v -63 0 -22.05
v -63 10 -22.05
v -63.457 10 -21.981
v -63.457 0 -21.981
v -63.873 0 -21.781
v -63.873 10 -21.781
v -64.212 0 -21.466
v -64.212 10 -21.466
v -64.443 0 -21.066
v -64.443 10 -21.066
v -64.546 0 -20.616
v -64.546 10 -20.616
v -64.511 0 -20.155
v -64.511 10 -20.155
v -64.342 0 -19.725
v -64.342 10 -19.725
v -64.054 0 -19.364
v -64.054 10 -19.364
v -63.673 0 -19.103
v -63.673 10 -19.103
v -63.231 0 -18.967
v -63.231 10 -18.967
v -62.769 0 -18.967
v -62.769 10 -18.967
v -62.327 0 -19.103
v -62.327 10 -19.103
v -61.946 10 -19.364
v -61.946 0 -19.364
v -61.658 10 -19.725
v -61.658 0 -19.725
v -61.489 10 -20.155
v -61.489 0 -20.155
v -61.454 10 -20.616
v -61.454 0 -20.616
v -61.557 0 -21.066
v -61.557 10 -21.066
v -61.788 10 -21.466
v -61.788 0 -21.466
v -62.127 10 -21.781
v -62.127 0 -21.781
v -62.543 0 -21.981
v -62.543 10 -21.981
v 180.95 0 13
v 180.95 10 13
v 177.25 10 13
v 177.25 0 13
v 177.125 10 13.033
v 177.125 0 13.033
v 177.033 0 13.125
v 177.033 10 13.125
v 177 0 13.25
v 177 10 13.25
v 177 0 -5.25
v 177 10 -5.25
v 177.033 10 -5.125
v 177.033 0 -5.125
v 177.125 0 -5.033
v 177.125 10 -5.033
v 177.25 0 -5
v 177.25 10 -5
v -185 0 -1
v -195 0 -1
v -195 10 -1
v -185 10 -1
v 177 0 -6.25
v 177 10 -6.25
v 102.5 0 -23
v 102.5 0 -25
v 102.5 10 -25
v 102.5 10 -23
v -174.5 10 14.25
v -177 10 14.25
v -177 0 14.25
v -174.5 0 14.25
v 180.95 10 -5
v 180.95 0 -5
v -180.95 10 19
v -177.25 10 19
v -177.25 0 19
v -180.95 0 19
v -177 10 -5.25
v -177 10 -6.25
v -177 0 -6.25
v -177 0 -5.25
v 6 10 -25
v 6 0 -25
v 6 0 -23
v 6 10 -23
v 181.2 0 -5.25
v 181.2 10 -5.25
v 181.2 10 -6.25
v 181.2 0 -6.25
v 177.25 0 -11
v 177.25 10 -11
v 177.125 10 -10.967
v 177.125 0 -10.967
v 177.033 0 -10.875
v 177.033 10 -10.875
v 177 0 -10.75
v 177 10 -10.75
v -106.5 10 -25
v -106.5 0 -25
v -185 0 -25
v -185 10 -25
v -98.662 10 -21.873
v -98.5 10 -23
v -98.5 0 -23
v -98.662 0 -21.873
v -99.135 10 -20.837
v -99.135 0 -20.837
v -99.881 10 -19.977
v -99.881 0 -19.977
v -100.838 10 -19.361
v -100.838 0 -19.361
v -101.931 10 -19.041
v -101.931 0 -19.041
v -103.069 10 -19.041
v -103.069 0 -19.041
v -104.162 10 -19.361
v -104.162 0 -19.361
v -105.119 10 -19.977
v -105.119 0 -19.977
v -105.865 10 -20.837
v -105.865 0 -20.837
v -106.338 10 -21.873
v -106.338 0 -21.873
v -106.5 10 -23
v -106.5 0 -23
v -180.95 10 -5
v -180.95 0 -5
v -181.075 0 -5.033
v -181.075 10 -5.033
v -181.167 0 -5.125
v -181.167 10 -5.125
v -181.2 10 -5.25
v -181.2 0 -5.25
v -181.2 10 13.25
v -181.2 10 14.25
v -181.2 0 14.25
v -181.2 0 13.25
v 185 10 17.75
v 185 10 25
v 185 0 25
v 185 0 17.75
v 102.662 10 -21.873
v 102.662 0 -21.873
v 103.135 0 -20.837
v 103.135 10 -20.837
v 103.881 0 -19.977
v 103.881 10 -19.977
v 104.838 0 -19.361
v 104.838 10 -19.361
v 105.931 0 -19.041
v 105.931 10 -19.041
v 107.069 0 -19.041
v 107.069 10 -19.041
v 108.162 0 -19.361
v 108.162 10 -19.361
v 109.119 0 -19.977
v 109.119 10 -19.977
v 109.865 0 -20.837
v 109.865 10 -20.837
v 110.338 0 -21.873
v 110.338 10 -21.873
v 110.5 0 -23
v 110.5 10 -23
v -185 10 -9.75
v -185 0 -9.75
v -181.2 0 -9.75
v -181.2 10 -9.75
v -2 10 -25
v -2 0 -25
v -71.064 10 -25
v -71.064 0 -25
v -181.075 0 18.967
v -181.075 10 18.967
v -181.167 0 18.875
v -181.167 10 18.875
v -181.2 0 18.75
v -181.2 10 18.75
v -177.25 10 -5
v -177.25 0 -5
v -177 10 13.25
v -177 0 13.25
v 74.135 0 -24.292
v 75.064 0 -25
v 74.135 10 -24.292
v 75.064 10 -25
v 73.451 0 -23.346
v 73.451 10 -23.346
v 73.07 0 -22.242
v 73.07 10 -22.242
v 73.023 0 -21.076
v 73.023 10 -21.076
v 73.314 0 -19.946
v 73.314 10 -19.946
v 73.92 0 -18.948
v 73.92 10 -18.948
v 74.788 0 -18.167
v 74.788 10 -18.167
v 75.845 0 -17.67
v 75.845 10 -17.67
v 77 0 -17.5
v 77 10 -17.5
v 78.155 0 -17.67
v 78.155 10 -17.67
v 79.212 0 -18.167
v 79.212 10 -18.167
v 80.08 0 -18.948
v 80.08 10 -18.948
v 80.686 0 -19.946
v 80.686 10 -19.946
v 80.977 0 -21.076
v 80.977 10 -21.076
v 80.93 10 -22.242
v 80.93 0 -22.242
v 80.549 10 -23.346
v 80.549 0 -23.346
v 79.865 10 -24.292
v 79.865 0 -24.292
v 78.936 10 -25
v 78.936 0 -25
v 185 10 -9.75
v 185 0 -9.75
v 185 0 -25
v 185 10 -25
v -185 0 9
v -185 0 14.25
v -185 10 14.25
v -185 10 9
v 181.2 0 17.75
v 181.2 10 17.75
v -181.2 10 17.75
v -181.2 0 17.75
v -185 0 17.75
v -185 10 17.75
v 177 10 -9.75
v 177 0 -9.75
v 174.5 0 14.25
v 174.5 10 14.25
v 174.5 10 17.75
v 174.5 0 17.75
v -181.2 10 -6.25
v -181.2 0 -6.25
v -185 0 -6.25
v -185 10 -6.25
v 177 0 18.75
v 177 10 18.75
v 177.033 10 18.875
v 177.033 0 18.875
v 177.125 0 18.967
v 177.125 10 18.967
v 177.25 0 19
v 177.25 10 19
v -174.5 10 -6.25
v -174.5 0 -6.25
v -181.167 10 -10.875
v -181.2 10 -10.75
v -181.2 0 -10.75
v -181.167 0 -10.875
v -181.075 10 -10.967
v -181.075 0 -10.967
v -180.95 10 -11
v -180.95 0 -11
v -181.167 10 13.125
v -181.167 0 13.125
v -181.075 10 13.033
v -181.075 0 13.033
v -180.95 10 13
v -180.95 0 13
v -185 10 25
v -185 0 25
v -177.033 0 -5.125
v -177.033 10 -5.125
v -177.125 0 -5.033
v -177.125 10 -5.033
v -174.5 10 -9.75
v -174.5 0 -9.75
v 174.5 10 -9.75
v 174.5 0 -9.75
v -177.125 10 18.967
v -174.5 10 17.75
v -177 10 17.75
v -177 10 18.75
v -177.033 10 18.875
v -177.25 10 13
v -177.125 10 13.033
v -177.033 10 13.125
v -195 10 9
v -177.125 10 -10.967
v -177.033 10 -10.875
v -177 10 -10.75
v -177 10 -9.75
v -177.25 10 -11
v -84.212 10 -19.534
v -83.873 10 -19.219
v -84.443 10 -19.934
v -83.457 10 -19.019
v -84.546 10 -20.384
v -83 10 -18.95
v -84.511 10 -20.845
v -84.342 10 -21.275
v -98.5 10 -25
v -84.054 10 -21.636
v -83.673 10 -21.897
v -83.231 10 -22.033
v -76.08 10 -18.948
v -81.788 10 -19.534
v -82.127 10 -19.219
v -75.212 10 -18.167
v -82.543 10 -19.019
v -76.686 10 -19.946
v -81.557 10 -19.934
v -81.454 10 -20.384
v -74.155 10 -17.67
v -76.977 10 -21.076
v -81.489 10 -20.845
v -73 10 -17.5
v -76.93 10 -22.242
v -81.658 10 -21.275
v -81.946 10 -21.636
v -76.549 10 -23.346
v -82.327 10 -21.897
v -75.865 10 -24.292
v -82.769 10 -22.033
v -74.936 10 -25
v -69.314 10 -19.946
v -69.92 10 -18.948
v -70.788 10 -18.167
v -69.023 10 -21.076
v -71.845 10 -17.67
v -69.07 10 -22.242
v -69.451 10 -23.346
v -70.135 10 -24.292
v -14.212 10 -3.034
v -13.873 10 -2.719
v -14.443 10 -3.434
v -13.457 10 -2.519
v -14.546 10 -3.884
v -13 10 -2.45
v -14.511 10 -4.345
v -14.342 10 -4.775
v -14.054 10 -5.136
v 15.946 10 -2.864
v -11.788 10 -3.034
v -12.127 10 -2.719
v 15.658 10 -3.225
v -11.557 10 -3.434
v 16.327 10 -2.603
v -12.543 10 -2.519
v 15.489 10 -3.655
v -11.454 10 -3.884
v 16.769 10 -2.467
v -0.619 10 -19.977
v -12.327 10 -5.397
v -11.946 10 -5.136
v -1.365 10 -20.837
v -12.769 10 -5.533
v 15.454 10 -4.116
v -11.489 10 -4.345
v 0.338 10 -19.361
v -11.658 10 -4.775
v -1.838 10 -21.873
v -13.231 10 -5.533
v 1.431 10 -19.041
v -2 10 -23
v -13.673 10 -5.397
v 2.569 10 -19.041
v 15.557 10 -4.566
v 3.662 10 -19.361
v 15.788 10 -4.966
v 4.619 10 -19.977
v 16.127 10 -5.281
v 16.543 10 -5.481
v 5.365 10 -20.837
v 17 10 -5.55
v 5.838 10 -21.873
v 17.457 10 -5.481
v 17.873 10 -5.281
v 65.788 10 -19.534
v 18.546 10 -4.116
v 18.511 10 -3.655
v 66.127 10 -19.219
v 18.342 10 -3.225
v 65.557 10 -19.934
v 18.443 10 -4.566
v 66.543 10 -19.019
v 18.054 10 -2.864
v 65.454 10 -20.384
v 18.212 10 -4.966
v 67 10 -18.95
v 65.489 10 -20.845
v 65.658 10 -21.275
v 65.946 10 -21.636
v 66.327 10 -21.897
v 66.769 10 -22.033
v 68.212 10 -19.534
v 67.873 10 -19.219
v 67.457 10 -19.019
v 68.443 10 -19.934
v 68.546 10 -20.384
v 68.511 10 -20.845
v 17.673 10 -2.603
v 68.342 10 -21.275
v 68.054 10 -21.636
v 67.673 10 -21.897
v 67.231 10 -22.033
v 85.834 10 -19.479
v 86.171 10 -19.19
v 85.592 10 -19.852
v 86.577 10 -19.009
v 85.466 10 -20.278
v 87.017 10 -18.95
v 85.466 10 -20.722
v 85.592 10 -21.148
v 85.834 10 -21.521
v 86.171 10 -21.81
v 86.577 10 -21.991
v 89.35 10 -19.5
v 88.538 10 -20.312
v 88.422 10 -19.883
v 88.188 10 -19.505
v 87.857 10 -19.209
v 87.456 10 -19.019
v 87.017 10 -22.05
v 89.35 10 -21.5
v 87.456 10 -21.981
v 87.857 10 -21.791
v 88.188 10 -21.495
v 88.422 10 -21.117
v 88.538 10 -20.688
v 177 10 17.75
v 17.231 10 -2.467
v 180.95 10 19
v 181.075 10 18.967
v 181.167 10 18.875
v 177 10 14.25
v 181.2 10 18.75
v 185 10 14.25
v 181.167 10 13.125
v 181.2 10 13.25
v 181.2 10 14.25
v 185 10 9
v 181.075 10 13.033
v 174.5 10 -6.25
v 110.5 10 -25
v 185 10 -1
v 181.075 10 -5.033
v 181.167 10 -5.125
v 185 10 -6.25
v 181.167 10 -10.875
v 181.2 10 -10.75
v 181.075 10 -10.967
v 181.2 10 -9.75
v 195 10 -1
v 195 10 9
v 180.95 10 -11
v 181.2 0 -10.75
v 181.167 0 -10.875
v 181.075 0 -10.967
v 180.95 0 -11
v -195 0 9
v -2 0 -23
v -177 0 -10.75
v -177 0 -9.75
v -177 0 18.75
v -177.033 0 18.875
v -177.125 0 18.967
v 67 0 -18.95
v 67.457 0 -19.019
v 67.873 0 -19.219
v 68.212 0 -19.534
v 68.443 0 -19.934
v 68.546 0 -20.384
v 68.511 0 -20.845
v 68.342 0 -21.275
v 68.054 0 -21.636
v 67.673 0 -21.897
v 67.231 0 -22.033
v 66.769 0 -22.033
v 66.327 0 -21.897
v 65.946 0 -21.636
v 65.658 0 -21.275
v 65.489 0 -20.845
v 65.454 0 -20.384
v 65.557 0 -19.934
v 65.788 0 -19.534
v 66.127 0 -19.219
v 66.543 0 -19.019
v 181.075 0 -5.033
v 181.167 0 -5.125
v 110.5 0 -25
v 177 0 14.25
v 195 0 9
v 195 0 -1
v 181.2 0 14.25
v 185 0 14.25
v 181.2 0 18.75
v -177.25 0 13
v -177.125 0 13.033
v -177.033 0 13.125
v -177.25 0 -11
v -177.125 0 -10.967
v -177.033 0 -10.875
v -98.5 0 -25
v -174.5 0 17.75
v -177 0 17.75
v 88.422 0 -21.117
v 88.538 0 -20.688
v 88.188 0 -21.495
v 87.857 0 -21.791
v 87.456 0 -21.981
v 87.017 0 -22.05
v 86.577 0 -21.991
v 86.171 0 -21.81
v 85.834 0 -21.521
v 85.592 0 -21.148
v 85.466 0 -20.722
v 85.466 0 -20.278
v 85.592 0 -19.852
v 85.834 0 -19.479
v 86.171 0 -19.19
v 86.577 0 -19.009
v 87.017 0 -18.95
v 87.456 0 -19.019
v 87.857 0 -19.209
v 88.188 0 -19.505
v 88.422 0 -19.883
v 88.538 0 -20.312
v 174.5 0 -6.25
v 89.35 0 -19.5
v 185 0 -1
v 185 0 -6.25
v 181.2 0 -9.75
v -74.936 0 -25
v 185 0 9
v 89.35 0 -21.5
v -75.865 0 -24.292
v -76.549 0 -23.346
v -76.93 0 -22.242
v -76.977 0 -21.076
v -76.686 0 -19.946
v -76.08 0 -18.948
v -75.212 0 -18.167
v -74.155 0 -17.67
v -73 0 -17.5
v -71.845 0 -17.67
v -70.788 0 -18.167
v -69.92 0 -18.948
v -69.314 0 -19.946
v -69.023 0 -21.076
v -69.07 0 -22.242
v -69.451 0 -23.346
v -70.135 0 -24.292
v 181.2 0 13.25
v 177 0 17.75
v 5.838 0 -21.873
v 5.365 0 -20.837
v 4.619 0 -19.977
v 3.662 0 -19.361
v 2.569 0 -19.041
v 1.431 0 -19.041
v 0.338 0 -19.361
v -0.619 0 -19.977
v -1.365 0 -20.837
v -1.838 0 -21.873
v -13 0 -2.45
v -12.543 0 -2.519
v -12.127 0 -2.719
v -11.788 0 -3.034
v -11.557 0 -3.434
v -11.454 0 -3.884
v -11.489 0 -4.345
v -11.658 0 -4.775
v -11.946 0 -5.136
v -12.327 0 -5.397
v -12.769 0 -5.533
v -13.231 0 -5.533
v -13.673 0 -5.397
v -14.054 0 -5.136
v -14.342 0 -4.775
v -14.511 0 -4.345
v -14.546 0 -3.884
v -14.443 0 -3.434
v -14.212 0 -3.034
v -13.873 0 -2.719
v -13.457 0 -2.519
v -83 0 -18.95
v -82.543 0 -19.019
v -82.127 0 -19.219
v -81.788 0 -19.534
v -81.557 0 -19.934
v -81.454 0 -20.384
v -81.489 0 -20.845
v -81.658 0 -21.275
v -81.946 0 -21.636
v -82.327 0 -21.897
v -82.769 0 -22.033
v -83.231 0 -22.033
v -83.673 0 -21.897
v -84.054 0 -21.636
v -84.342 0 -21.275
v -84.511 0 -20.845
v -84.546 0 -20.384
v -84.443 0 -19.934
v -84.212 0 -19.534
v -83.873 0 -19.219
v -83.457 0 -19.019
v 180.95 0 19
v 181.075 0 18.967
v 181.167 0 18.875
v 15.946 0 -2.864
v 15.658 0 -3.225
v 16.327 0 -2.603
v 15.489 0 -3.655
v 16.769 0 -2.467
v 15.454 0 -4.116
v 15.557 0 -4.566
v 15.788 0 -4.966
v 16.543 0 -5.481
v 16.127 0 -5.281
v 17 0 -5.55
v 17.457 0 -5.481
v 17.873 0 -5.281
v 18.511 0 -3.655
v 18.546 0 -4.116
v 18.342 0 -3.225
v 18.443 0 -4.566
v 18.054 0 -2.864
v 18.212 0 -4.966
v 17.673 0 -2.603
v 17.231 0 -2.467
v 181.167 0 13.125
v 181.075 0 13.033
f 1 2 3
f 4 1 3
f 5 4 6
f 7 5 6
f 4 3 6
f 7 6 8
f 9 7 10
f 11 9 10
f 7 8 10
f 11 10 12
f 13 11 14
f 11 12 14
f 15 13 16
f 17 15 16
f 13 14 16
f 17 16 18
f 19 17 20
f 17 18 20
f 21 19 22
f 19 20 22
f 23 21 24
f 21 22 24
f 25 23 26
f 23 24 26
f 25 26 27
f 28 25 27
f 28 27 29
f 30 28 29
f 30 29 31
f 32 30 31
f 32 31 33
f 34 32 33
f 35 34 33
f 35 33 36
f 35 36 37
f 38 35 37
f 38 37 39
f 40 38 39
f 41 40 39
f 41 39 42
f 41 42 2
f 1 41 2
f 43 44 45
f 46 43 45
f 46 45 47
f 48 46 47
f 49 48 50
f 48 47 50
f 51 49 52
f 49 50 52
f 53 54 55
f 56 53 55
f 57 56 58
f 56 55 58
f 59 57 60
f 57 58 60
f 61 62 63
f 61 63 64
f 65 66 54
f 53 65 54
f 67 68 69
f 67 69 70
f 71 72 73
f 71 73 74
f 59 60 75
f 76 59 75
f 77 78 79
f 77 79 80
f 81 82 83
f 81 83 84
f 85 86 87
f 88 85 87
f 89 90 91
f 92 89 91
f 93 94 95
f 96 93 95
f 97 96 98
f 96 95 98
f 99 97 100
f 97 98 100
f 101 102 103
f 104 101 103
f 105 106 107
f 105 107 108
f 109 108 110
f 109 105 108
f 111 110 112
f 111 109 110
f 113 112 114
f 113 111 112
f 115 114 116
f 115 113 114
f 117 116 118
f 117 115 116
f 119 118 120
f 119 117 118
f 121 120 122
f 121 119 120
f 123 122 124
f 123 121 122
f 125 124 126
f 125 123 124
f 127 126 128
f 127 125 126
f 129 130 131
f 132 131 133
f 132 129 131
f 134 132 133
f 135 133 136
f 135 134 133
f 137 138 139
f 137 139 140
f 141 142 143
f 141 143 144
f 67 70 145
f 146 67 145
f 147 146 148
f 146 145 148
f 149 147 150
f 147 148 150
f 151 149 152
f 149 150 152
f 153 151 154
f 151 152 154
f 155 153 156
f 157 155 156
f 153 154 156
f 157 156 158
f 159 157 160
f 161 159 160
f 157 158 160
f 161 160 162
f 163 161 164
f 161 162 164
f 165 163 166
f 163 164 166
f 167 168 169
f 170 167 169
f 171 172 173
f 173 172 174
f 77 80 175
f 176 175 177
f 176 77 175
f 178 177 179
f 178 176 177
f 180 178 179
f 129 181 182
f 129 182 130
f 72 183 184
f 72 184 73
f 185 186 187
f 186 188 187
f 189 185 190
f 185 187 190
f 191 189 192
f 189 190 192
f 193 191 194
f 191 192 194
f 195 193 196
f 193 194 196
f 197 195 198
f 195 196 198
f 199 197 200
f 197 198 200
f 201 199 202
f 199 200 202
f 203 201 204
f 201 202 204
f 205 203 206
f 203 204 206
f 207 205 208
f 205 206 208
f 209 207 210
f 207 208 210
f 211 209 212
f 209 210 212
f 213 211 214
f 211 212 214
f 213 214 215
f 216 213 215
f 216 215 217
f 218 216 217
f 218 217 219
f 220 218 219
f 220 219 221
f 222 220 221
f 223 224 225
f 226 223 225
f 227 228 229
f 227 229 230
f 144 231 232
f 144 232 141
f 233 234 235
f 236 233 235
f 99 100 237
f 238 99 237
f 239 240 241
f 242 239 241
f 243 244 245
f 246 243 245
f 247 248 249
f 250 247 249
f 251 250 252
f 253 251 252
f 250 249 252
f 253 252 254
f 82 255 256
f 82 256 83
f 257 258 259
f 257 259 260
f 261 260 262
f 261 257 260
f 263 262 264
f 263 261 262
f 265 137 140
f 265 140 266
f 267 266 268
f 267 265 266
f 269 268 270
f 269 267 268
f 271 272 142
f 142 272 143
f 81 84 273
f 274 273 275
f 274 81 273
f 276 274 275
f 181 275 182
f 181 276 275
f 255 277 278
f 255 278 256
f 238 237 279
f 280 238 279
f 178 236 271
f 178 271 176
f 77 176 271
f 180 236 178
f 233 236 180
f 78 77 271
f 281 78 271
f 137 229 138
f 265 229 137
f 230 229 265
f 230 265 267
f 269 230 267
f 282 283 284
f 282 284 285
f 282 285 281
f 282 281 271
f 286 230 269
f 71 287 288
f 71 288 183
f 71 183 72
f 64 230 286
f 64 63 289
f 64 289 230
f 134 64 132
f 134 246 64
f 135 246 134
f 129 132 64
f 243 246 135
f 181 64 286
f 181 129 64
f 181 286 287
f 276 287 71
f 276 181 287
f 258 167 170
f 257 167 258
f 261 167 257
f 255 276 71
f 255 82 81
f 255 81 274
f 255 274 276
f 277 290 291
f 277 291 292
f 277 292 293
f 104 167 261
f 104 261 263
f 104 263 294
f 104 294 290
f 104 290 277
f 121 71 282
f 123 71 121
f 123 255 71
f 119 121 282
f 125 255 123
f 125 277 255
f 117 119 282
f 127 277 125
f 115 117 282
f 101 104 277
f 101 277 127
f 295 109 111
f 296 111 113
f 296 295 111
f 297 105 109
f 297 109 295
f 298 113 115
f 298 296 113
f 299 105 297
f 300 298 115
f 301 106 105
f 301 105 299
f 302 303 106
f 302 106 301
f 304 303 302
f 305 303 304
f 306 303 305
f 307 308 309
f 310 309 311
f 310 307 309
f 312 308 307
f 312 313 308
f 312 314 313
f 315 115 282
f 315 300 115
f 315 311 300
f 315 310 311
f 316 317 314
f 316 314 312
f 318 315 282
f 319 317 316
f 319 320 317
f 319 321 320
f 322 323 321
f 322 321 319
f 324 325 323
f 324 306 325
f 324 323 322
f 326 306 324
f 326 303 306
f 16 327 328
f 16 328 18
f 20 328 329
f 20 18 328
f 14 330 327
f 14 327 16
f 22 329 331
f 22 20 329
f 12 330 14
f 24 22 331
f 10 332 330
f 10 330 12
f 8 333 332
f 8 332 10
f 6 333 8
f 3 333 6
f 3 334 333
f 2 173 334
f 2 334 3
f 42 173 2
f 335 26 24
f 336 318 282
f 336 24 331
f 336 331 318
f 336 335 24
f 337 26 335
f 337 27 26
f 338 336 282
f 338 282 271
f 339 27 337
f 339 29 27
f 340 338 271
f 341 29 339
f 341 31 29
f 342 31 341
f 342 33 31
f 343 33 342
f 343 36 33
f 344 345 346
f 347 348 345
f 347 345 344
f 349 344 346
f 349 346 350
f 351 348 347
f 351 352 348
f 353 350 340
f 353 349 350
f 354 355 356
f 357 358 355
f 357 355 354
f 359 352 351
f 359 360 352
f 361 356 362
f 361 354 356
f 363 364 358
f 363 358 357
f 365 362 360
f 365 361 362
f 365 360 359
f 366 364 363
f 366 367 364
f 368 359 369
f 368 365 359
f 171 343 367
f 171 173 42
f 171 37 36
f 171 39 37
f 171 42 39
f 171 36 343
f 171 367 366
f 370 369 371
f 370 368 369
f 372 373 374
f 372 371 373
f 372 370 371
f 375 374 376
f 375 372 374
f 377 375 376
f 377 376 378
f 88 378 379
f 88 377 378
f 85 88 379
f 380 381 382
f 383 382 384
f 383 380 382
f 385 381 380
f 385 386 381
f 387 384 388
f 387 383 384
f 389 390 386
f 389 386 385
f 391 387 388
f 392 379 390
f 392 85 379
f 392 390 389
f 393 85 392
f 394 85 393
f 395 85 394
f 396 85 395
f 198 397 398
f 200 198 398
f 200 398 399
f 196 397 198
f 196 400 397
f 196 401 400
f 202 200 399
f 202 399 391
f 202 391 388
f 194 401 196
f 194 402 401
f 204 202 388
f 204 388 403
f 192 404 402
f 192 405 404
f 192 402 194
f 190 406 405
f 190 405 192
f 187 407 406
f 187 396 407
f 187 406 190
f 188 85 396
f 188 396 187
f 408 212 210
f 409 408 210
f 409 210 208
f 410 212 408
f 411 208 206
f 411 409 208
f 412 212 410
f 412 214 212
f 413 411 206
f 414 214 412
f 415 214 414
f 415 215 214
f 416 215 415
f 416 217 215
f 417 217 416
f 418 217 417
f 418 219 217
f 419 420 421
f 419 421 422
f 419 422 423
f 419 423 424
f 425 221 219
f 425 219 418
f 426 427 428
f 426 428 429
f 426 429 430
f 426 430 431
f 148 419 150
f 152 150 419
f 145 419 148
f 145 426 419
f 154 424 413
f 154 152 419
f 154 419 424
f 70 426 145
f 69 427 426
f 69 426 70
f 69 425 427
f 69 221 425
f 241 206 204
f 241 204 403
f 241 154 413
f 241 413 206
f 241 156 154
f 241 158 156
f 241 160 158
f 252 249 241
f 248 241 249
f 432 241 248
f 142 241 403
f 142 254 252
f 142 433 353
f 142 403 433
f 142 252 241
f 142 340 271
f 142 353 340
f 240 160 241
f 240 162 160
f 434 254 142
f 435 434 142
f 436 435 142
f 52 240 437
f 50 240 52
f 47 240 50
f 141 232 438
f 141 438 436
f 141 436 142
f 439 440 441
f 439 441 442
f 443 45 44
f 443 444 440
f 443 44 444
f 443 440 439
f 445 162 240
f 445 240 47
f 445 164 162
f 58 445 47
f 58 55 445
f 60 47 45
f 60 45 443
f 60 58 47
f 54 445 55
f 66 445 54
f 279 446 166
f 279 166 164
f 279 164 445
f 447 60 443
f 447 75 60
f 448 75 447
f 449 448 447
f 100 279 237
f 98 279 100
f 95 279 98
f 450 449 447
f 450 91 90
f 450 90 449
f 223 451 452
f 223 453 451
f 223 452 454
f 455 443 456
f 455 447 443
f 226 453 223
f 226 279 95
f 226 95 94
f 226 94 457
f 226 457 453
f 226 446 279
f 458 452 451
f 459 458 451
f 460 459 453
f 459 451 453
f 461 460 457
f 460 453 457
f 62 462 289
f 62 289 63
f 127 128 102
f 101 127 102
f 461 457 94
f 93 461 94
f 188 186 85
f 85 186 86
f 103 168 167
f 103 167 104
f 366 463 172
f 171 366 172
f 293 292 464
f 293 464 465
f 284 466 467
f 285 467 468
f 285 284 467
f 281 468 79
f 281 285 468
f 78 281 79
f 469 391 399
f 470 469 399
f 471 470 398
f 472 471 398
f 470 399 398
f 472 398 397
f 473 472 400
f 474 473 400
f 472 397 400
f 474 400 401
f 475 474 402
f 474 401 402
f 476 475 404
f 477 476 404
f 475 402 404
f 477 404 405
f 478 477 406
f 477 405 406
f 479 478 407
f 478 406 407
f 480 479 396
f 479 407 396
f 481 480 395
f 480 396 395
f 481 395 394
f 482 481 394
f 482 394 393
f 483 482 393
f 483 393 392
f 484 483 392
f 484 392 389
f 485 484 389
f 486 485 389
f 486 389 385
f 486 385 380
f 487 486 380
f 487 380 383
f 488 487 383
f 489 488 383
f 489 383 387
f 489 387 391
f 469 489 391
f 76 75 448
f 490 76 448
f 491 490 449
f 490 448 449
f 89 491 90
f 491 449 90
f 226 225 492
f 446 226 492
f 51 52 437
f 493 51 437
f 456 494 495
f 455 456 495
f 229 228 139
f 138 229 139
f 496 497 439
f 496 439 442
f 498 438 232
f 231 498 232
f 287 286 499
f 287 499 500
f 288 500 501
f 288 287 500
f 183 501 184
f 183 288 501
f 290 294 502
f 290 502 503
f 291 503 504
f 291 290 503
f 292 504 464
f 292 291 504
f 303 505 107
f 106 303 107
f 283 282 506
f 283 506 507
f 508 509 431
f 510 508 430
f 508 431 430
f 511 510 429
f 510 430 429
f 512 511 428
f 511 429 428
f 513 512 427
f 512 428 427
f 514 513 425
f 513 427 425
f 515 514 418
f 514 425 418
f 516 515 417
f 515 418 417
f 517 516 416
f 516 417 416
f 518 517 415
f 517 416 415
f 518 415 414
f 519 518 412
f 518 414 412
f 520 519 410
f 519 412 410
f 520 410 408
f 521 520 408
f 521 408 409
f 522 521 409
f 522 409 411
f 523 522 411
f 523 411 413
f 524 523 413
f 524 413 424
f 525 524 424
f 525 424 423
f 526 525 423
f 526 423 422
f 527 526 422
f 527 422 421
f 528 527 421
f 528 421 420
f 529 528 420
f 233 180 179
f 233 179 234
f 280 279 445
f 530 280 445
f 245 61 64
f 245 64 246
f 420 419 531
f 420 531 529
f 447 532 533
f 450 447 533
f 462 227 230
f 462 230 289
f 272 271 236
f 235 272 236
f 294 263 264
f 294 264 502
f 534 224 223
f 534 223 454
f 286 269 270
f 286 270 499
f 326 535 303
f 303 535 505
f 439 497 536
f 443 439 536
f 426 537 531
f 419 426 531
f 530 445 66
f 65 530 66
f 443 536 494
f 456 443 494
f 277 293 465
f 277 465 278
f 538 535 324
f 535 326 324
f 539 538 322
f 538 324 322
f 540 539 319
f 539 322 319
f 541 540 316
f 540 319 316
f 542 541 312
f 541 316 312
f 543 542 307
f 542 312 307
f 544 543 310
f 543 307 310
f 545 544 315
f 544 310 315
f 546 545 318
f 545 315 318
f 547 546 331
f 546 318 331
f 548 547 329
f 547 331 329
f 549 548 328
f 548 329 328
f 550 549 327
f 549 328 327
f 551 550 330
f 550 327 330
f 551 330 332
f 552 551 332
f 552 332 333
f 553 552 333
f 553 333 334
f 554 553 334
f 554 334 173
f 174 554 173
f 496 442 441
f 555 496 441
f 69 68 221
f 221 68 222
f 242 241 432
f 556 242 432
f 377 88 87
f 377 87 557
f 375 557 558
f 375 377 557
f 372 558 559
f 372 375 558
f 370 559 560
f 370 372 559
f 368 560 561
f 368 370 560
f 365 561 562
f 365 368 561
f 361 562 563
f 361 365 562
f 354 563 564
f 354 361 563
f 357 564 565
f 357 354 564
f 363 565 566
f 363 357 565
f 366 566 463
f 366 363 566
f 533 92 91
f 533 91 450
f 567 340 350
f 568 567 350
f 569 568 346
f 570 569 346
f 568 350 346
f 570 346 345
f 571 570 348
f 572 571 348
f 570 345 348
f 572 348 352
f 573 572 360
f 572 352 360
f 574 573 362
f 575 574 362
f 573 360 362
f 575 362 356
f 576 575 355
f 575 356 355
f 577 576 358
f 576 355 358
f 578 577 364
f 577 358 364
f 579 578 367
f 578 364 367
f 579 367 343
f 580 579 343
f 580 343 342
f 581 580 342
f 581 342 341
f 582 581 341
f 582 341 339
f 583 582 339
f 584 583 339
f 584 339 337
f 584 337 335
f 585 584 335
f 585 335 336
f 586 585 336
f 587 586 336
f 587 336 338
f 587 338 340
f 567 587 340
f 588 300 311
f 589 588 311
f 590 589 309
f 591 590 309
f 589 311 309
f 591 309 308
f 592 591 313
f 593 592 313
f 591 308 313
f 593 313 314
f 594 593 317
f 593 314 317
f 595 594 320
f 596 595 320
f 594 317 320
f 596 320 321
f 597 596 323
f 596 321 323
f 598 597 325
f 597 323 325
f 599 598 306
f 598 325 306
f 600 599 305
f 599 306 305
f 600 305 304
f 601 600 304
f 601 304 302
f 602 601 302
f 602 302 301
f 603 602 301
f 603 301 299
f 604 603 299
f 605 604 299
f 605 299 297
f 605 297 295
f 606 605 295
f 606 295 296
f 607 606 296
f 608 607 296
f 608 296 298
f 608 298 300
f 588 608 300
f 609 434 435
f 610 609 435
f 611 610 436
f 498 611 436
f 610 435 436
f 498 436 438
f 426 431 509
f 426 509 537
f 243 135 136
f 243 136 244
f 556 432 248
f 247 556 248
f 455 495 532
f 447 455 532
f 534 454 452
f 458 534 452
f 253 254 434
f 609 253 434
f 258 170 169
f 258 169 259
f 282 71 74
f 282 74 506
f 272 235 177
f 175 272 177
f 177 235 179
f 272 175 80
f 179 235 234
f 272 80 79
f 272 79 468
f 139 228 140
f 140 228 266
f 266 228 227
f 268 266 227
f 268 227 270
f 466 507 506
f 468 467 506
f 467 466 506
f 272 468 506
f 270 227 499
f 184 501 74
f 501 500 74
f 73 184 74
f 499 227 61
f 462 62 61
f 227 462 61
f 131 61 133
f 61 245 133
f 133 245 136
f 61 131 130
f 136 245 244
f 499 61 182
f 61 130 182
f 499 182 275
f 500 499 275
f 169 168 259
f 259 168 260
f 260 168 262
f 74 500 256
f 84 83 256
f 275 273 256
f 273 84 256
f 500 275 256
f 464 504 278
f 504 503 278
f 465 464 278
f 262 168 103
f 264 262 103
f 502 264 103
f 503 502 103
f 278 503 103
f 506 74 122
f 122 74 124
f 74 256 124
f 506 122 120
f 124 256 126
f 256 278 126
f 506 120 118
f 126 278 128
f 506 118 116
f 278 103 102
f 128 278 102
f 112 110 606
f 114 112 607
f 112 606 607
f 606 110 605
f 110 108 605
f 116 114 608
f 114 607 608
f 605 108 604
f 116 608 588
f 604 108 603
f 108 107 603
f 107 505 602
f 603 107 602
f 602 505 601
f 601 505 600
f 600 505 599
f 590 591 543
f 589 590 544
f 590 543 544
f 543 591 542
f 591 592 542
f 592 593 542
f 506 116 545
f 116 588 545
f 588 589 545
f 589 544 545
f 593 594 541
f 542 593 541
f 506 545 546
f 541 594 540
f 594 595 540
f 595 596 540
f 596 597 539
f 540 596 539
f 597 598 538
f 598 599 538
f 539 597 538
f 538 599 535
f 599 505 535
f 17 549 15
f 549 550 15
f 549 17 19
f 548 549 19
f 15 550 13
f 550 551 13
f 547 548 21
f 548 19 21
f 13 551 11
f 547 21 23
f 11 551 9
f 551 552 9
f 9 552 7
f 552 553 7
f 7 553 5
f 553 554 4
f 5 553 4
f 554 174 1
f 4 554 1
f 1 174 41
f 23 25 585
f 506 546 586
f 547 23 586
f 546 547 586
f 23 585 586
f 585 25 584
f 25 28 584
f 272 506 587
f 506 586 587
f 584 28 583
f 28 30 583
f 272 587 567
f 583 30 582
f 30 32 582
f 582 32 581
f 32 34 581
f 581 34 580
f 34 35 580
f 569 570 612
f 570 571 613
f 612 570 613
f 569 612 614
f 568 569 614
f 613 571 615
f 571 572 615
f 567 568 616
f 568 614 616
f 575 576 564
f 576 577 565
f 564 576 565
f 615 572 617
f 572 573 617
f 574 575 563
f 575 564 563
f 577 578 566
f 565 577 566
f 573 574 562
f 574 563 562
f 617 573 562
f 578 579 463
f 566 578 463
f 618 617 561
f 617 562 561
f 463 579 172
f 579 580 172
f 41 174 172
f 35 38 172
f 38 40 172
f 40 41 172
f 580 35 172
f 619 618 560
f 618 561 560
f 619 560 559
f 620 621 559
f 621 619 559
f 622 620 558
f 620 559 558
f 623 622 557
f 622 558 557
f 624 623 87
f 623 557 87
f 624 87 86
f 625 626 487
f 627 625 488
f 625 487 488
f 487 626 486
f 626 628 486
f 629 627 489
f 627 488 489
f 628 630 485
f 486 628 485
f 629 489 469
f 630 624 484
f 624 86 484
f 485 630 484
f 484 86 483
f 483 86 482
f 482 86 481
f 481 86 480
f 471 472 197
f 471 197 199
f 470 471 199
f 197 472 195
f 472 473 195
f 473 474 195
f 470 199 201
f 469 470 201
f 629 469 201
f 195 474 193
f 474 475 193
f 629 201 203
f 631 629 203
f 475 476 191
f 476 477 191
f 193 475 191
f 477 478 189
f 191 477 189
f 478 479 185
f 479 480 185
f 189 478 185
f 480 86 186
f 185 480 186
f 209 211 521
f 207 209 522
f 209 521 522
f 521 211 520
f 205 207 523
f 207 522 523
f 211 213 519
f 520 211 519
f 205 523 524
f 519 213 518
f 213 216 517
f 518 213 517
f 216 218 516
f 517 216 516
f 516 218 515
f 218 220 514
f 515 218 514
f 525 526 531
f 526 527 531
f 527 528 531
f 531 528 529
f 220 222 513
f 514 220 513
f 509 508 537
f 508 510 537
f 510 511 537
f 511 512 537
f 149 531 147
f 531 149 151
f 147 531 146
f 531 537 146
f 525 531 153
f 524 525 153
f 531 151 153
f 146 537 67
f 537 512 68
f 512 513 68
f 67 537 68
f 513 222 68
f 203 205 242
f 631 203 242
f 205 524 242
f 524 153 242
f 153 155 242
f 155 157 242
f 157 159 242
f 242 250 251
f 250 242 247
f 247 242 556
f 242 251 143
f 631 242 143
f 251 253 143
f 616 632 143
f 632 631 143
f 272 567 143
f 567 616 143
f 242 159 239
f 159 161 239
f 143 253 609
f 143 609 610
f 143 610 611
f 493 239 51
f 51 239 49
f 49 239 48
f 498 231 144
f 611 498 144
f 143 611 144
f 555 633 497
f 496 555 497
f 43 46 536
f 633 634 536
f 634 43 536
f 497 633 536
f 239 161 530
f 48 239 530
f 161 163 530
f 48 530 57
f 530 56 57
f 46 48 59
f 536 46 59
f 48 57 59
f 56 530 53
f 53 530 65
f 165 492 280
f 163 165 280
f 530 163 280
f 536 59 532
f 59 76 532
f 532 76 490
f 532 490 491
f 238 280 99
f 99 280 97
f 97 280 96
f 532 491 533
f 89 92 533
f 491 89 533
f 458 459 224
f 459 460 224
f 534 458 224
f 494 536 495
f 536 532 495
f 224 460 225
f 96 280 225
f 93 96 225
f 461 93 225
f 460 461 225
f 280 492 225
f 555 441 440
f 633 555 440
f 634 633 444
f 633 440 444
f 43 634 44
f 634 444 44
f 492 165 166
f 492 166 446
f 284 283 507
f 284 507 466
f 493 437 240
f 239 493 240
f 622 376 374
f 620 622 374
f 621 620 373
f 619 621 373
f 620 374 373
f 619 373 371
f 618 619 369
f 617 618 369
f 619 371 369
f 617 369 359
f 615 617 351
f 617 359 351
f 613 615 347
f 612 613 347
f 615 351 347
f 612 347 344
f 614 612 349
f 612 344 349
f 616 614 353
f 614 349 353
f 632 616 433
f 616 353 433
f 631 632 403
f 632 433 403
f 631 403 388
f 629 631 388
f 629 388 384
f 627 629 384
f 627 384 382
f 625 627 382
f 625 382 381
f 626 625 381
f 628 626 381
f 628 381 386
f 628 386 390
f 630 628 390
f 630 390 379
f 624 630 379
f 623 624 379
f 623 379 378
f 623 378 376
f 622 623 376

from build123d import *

# Parameters (mm, degrees)
MAINBODY_DEPTH                 = 10
SCREWCUTOUTS_DEPTH             = 197.85019685
SKETCH3_R                      = 4
SKETCH3_R_2                    = 1.55
RODCUTOUTS_DEPTH               = 197.85019685
SKETCH6_R                      = 1.55
CUT_EXTRUDE1_DEPTH             = 197.85019685
BEDADJUSTMENTSCREWCUTOUT_DEPTH = 197.85019685
DIRECTIONKEY_DEPTH             = 197.85019685
CUT_EXTRUDE2_DEPTH             = 197.85019685


with BuildPart() as part:
    # Sketch1 → MainBody (new body)
    with BuildSketch(Plane(origin=(0, 0, 0), x_dir=(1, 0, 0), z_dir=(0, 1, 0))):
        Polygon((0, 25), (0, -25), (-185, -25), (-185, -9), (-195, -9), (-195, 1), (-185, 1), (-185, 25), align=None)
    mainbody = extrude(amount=MAINBODY_DEPTH)

    # Sketch5 → ScrewCutouts (cut, through all)
    with BuildSketch(Plane(origin=(0, 10, 0), x_dir=(1, 0, 0), z_dir=(0, 1, 0))):
        with BuildLine():
            Line((-185, 9.75), (-181.2, 9.75))
            Line((-181.2, 9.75), (-181.2, 10.75))
            ThreePointArc((-181.2, 10.75), (-181.126776695, 10.926776695), (-180.95, 11))
            Line((-180.95, 11), (-177.25, 11))
            ThreePointArc((-177.25, 11), (-177.073223305, 10.926776695), (-177, 10.75))
            Line((-177, 10.75), (-177, 9.75))
            Line((-177, 9.75), (-174.5, 9.75))
            Line((-174.5, 9.75), (-174.5, 6.25))
            Line((-174.5, 6.25), (-177, 6.25))
            Line((-177, 6.25), (-177, 5.25))
            ThreePointArc((-177, 5.25), (-177.073223305, 5.073223305), (-177.25, 5))
            Line((-177.25, 5), (-180.95, 5))
            ThreePointArc((-180.95, 5), (-181.126776695, 5.073223305), (-181.2, 5.25))
            Line((-181.2, 5.25), (-181.2, 6.25))
            Line((-181.2, 6.25), (-185, 6.25))
            Line((-185, 6.25), (-185, 9.75))
        make_face()
        with BuildLine():
            Line((-185, -14.25), (-181.2, -14.25))
            Line((-181.2, -14.25), (-181.2, -13.25))
            ThreePointArc((-181.2, -13.25), (-181.126776695, -13.073223305), (-180.95, -13))
            Line((-180.95, -13), (-177.25, -13))
            ThreePointArc((-177.25, -13), (-177.073223305, -13.073223305), (-177, -13.25))
            Line((-177, -13.25), (-177, -14.25))
            Line((-177, -14.25), (-174.5, -14.25))
            Line((-174.5, -14.25), (-174.5, -17.75))
            Line((-174.5, -17.75), (-177, -17.75))
            Line((-177, -17.75), (-177, -18.75))
            ThreePointArc((-177, -18.75), (-177.073223305, -18.926776695), (-177.25, -19))
            Line((-177.25, -19), (-180.95, -19))
            ThreePointArc((-180.95, -19), (-181.126776695, -18.926776695), (-181.2, -18.75))
            Line((-181.2, -18.75), (-181.2, -17.75))
            Line((-181.2, -17.75), (-185, -17.75))
            Line((-185, -17.75), (-185, -14.25))
        make_face()
    screwcutouts = extrude(amount=-SCREWCUTOUTS_DEPTH, mode=Mode.SUBTRACT)

    # Mirror1: MainBody, ScrewCutouts across plane
    add(mainbody.mirror(Plane(origin=(0, 0, 0), x_dir=(0, 0, 1), z_dir=(1, 0, 0))))
    add(screwcutouts.mirror(Plane(origin=(0, 0, 0), x_dir=(0, 0, 1), z_dir=(1, 0, 0))), mode=Mode.SUBTRACT)

    # Sketch3 → RodCutouts (cut, through all)
    with BuildSketch(Plane(origin=(0, 10, 0), x_dir=(1, 0, 0), z_dir=(0, 1, 0))):
        with Locations((-73, 21.5)):
            Circle(SKETCH3_R)
        with Locations(Location((-83, 20.5, 0), (0, 0, 270))):
            Circle(SKETCH3_R_2)
        with Locations(Location((-63, 20.5, 0), (0, 0, 90))):
            Circle(SKETCH3_R_2)
        with Locations(Location((67, 20.5, 0), (0, 0, 270))):
            Circle(SKETCH3_R_2)
        with Locations(Location((87, 20.5, 0), (0, 0, 90))):
            Circle(SKETCH3_R_2)
        with Locations((77, 21.5)):
            Circle(SKETCH3_R)
    extrude(amount=-RODCUTOUTS_DEPTH, mode=Mode.SUBTRACT)

    # Sketch6 → Cut-Extrude1 (cut, through all)
    with BuildSketch(Plane(origin=(0, 10, 0), x_dir=(1, 0, 0), z_dir=(0, 1, 0))):
        with Locations(Location((-13, 4, 0), (0, 0, 270))):
            Circle(SKETCH6_R)
        with Locations(Location((17, 4, 0), (0, 0, 90))):
            Circle(SKETCH6_R)
    extrude(amount=-CUT_EXTRUDE1_DEPTH, mode=Mode.SUBTRACT)

    # Sketch7 → BedAdjustmentScrewCutout (cut, through all)
    with BuildSketch(Plane(origin=(0, 10, 0), x_dir=(1, 0, 0), z_dir=(0, 1, 0))):
        with BuildLine():
            Line((-98.5, 25), (-98.5, 23))
            ThreePointArc((-98.5, 23), (-102.5, 19), (-106.5, 23))
            Line((-106.5, 23), (-106.5, 25))
            ThreePointArc((-106.5, 25), (-102.5, 29), (-98.5, 25))
        make_face()
        with BuildLine():
            Line((102.5, 25), (102.5, 23))
            ThreePointArc((102.5, 23), (106.5, 19), (110.5, 23))
            Line((110.5, 23), (110.5, 25))
            ThreePointArc((110.5, 25), (106.5, 29), (102.5, 25))
        make_face()
    extrude(amount=-BEDADJUSTMENTSCREWCUTOUT_DEPTH, mode=Mode.SUBTRACT)

    # Sketch8 → DirectionKey (cut, through all)
    with BuildSketch(Plane(origin=(0, 10, 0), x_dir=(1, 0, 0), z_dir=(0, 1, 0))):
        Polygon((88.35, 20.5), (89.35, 21.5), (89.35, 19.5), align=None)
    extrude(amount=-DIRECTIONKEY_DEPTH, mode=Mode.SUBTRACT)

    # Sketch9 → Cut-Extrude2 (cut, through all)
    with BuildSketch(Plane(origin=(0, 10, 0), x_dir=(1, 0, 0), z_dir=(0, 1, 0))):
        with BuildLine():
            Line((6, 27), (6, 23))
            ThreePointArc((6, 23), (2, 19), (-2, 23))
            Line((-2, 23), (-2, 27))
            ThreePointArc((-2, 27), (2, 31), (6, 27))
        make_face()
    extrude(amount=-CUT_EXTRUDE2_DEPTH, mode=Mode.SUBTRACT)


solid = part.part
